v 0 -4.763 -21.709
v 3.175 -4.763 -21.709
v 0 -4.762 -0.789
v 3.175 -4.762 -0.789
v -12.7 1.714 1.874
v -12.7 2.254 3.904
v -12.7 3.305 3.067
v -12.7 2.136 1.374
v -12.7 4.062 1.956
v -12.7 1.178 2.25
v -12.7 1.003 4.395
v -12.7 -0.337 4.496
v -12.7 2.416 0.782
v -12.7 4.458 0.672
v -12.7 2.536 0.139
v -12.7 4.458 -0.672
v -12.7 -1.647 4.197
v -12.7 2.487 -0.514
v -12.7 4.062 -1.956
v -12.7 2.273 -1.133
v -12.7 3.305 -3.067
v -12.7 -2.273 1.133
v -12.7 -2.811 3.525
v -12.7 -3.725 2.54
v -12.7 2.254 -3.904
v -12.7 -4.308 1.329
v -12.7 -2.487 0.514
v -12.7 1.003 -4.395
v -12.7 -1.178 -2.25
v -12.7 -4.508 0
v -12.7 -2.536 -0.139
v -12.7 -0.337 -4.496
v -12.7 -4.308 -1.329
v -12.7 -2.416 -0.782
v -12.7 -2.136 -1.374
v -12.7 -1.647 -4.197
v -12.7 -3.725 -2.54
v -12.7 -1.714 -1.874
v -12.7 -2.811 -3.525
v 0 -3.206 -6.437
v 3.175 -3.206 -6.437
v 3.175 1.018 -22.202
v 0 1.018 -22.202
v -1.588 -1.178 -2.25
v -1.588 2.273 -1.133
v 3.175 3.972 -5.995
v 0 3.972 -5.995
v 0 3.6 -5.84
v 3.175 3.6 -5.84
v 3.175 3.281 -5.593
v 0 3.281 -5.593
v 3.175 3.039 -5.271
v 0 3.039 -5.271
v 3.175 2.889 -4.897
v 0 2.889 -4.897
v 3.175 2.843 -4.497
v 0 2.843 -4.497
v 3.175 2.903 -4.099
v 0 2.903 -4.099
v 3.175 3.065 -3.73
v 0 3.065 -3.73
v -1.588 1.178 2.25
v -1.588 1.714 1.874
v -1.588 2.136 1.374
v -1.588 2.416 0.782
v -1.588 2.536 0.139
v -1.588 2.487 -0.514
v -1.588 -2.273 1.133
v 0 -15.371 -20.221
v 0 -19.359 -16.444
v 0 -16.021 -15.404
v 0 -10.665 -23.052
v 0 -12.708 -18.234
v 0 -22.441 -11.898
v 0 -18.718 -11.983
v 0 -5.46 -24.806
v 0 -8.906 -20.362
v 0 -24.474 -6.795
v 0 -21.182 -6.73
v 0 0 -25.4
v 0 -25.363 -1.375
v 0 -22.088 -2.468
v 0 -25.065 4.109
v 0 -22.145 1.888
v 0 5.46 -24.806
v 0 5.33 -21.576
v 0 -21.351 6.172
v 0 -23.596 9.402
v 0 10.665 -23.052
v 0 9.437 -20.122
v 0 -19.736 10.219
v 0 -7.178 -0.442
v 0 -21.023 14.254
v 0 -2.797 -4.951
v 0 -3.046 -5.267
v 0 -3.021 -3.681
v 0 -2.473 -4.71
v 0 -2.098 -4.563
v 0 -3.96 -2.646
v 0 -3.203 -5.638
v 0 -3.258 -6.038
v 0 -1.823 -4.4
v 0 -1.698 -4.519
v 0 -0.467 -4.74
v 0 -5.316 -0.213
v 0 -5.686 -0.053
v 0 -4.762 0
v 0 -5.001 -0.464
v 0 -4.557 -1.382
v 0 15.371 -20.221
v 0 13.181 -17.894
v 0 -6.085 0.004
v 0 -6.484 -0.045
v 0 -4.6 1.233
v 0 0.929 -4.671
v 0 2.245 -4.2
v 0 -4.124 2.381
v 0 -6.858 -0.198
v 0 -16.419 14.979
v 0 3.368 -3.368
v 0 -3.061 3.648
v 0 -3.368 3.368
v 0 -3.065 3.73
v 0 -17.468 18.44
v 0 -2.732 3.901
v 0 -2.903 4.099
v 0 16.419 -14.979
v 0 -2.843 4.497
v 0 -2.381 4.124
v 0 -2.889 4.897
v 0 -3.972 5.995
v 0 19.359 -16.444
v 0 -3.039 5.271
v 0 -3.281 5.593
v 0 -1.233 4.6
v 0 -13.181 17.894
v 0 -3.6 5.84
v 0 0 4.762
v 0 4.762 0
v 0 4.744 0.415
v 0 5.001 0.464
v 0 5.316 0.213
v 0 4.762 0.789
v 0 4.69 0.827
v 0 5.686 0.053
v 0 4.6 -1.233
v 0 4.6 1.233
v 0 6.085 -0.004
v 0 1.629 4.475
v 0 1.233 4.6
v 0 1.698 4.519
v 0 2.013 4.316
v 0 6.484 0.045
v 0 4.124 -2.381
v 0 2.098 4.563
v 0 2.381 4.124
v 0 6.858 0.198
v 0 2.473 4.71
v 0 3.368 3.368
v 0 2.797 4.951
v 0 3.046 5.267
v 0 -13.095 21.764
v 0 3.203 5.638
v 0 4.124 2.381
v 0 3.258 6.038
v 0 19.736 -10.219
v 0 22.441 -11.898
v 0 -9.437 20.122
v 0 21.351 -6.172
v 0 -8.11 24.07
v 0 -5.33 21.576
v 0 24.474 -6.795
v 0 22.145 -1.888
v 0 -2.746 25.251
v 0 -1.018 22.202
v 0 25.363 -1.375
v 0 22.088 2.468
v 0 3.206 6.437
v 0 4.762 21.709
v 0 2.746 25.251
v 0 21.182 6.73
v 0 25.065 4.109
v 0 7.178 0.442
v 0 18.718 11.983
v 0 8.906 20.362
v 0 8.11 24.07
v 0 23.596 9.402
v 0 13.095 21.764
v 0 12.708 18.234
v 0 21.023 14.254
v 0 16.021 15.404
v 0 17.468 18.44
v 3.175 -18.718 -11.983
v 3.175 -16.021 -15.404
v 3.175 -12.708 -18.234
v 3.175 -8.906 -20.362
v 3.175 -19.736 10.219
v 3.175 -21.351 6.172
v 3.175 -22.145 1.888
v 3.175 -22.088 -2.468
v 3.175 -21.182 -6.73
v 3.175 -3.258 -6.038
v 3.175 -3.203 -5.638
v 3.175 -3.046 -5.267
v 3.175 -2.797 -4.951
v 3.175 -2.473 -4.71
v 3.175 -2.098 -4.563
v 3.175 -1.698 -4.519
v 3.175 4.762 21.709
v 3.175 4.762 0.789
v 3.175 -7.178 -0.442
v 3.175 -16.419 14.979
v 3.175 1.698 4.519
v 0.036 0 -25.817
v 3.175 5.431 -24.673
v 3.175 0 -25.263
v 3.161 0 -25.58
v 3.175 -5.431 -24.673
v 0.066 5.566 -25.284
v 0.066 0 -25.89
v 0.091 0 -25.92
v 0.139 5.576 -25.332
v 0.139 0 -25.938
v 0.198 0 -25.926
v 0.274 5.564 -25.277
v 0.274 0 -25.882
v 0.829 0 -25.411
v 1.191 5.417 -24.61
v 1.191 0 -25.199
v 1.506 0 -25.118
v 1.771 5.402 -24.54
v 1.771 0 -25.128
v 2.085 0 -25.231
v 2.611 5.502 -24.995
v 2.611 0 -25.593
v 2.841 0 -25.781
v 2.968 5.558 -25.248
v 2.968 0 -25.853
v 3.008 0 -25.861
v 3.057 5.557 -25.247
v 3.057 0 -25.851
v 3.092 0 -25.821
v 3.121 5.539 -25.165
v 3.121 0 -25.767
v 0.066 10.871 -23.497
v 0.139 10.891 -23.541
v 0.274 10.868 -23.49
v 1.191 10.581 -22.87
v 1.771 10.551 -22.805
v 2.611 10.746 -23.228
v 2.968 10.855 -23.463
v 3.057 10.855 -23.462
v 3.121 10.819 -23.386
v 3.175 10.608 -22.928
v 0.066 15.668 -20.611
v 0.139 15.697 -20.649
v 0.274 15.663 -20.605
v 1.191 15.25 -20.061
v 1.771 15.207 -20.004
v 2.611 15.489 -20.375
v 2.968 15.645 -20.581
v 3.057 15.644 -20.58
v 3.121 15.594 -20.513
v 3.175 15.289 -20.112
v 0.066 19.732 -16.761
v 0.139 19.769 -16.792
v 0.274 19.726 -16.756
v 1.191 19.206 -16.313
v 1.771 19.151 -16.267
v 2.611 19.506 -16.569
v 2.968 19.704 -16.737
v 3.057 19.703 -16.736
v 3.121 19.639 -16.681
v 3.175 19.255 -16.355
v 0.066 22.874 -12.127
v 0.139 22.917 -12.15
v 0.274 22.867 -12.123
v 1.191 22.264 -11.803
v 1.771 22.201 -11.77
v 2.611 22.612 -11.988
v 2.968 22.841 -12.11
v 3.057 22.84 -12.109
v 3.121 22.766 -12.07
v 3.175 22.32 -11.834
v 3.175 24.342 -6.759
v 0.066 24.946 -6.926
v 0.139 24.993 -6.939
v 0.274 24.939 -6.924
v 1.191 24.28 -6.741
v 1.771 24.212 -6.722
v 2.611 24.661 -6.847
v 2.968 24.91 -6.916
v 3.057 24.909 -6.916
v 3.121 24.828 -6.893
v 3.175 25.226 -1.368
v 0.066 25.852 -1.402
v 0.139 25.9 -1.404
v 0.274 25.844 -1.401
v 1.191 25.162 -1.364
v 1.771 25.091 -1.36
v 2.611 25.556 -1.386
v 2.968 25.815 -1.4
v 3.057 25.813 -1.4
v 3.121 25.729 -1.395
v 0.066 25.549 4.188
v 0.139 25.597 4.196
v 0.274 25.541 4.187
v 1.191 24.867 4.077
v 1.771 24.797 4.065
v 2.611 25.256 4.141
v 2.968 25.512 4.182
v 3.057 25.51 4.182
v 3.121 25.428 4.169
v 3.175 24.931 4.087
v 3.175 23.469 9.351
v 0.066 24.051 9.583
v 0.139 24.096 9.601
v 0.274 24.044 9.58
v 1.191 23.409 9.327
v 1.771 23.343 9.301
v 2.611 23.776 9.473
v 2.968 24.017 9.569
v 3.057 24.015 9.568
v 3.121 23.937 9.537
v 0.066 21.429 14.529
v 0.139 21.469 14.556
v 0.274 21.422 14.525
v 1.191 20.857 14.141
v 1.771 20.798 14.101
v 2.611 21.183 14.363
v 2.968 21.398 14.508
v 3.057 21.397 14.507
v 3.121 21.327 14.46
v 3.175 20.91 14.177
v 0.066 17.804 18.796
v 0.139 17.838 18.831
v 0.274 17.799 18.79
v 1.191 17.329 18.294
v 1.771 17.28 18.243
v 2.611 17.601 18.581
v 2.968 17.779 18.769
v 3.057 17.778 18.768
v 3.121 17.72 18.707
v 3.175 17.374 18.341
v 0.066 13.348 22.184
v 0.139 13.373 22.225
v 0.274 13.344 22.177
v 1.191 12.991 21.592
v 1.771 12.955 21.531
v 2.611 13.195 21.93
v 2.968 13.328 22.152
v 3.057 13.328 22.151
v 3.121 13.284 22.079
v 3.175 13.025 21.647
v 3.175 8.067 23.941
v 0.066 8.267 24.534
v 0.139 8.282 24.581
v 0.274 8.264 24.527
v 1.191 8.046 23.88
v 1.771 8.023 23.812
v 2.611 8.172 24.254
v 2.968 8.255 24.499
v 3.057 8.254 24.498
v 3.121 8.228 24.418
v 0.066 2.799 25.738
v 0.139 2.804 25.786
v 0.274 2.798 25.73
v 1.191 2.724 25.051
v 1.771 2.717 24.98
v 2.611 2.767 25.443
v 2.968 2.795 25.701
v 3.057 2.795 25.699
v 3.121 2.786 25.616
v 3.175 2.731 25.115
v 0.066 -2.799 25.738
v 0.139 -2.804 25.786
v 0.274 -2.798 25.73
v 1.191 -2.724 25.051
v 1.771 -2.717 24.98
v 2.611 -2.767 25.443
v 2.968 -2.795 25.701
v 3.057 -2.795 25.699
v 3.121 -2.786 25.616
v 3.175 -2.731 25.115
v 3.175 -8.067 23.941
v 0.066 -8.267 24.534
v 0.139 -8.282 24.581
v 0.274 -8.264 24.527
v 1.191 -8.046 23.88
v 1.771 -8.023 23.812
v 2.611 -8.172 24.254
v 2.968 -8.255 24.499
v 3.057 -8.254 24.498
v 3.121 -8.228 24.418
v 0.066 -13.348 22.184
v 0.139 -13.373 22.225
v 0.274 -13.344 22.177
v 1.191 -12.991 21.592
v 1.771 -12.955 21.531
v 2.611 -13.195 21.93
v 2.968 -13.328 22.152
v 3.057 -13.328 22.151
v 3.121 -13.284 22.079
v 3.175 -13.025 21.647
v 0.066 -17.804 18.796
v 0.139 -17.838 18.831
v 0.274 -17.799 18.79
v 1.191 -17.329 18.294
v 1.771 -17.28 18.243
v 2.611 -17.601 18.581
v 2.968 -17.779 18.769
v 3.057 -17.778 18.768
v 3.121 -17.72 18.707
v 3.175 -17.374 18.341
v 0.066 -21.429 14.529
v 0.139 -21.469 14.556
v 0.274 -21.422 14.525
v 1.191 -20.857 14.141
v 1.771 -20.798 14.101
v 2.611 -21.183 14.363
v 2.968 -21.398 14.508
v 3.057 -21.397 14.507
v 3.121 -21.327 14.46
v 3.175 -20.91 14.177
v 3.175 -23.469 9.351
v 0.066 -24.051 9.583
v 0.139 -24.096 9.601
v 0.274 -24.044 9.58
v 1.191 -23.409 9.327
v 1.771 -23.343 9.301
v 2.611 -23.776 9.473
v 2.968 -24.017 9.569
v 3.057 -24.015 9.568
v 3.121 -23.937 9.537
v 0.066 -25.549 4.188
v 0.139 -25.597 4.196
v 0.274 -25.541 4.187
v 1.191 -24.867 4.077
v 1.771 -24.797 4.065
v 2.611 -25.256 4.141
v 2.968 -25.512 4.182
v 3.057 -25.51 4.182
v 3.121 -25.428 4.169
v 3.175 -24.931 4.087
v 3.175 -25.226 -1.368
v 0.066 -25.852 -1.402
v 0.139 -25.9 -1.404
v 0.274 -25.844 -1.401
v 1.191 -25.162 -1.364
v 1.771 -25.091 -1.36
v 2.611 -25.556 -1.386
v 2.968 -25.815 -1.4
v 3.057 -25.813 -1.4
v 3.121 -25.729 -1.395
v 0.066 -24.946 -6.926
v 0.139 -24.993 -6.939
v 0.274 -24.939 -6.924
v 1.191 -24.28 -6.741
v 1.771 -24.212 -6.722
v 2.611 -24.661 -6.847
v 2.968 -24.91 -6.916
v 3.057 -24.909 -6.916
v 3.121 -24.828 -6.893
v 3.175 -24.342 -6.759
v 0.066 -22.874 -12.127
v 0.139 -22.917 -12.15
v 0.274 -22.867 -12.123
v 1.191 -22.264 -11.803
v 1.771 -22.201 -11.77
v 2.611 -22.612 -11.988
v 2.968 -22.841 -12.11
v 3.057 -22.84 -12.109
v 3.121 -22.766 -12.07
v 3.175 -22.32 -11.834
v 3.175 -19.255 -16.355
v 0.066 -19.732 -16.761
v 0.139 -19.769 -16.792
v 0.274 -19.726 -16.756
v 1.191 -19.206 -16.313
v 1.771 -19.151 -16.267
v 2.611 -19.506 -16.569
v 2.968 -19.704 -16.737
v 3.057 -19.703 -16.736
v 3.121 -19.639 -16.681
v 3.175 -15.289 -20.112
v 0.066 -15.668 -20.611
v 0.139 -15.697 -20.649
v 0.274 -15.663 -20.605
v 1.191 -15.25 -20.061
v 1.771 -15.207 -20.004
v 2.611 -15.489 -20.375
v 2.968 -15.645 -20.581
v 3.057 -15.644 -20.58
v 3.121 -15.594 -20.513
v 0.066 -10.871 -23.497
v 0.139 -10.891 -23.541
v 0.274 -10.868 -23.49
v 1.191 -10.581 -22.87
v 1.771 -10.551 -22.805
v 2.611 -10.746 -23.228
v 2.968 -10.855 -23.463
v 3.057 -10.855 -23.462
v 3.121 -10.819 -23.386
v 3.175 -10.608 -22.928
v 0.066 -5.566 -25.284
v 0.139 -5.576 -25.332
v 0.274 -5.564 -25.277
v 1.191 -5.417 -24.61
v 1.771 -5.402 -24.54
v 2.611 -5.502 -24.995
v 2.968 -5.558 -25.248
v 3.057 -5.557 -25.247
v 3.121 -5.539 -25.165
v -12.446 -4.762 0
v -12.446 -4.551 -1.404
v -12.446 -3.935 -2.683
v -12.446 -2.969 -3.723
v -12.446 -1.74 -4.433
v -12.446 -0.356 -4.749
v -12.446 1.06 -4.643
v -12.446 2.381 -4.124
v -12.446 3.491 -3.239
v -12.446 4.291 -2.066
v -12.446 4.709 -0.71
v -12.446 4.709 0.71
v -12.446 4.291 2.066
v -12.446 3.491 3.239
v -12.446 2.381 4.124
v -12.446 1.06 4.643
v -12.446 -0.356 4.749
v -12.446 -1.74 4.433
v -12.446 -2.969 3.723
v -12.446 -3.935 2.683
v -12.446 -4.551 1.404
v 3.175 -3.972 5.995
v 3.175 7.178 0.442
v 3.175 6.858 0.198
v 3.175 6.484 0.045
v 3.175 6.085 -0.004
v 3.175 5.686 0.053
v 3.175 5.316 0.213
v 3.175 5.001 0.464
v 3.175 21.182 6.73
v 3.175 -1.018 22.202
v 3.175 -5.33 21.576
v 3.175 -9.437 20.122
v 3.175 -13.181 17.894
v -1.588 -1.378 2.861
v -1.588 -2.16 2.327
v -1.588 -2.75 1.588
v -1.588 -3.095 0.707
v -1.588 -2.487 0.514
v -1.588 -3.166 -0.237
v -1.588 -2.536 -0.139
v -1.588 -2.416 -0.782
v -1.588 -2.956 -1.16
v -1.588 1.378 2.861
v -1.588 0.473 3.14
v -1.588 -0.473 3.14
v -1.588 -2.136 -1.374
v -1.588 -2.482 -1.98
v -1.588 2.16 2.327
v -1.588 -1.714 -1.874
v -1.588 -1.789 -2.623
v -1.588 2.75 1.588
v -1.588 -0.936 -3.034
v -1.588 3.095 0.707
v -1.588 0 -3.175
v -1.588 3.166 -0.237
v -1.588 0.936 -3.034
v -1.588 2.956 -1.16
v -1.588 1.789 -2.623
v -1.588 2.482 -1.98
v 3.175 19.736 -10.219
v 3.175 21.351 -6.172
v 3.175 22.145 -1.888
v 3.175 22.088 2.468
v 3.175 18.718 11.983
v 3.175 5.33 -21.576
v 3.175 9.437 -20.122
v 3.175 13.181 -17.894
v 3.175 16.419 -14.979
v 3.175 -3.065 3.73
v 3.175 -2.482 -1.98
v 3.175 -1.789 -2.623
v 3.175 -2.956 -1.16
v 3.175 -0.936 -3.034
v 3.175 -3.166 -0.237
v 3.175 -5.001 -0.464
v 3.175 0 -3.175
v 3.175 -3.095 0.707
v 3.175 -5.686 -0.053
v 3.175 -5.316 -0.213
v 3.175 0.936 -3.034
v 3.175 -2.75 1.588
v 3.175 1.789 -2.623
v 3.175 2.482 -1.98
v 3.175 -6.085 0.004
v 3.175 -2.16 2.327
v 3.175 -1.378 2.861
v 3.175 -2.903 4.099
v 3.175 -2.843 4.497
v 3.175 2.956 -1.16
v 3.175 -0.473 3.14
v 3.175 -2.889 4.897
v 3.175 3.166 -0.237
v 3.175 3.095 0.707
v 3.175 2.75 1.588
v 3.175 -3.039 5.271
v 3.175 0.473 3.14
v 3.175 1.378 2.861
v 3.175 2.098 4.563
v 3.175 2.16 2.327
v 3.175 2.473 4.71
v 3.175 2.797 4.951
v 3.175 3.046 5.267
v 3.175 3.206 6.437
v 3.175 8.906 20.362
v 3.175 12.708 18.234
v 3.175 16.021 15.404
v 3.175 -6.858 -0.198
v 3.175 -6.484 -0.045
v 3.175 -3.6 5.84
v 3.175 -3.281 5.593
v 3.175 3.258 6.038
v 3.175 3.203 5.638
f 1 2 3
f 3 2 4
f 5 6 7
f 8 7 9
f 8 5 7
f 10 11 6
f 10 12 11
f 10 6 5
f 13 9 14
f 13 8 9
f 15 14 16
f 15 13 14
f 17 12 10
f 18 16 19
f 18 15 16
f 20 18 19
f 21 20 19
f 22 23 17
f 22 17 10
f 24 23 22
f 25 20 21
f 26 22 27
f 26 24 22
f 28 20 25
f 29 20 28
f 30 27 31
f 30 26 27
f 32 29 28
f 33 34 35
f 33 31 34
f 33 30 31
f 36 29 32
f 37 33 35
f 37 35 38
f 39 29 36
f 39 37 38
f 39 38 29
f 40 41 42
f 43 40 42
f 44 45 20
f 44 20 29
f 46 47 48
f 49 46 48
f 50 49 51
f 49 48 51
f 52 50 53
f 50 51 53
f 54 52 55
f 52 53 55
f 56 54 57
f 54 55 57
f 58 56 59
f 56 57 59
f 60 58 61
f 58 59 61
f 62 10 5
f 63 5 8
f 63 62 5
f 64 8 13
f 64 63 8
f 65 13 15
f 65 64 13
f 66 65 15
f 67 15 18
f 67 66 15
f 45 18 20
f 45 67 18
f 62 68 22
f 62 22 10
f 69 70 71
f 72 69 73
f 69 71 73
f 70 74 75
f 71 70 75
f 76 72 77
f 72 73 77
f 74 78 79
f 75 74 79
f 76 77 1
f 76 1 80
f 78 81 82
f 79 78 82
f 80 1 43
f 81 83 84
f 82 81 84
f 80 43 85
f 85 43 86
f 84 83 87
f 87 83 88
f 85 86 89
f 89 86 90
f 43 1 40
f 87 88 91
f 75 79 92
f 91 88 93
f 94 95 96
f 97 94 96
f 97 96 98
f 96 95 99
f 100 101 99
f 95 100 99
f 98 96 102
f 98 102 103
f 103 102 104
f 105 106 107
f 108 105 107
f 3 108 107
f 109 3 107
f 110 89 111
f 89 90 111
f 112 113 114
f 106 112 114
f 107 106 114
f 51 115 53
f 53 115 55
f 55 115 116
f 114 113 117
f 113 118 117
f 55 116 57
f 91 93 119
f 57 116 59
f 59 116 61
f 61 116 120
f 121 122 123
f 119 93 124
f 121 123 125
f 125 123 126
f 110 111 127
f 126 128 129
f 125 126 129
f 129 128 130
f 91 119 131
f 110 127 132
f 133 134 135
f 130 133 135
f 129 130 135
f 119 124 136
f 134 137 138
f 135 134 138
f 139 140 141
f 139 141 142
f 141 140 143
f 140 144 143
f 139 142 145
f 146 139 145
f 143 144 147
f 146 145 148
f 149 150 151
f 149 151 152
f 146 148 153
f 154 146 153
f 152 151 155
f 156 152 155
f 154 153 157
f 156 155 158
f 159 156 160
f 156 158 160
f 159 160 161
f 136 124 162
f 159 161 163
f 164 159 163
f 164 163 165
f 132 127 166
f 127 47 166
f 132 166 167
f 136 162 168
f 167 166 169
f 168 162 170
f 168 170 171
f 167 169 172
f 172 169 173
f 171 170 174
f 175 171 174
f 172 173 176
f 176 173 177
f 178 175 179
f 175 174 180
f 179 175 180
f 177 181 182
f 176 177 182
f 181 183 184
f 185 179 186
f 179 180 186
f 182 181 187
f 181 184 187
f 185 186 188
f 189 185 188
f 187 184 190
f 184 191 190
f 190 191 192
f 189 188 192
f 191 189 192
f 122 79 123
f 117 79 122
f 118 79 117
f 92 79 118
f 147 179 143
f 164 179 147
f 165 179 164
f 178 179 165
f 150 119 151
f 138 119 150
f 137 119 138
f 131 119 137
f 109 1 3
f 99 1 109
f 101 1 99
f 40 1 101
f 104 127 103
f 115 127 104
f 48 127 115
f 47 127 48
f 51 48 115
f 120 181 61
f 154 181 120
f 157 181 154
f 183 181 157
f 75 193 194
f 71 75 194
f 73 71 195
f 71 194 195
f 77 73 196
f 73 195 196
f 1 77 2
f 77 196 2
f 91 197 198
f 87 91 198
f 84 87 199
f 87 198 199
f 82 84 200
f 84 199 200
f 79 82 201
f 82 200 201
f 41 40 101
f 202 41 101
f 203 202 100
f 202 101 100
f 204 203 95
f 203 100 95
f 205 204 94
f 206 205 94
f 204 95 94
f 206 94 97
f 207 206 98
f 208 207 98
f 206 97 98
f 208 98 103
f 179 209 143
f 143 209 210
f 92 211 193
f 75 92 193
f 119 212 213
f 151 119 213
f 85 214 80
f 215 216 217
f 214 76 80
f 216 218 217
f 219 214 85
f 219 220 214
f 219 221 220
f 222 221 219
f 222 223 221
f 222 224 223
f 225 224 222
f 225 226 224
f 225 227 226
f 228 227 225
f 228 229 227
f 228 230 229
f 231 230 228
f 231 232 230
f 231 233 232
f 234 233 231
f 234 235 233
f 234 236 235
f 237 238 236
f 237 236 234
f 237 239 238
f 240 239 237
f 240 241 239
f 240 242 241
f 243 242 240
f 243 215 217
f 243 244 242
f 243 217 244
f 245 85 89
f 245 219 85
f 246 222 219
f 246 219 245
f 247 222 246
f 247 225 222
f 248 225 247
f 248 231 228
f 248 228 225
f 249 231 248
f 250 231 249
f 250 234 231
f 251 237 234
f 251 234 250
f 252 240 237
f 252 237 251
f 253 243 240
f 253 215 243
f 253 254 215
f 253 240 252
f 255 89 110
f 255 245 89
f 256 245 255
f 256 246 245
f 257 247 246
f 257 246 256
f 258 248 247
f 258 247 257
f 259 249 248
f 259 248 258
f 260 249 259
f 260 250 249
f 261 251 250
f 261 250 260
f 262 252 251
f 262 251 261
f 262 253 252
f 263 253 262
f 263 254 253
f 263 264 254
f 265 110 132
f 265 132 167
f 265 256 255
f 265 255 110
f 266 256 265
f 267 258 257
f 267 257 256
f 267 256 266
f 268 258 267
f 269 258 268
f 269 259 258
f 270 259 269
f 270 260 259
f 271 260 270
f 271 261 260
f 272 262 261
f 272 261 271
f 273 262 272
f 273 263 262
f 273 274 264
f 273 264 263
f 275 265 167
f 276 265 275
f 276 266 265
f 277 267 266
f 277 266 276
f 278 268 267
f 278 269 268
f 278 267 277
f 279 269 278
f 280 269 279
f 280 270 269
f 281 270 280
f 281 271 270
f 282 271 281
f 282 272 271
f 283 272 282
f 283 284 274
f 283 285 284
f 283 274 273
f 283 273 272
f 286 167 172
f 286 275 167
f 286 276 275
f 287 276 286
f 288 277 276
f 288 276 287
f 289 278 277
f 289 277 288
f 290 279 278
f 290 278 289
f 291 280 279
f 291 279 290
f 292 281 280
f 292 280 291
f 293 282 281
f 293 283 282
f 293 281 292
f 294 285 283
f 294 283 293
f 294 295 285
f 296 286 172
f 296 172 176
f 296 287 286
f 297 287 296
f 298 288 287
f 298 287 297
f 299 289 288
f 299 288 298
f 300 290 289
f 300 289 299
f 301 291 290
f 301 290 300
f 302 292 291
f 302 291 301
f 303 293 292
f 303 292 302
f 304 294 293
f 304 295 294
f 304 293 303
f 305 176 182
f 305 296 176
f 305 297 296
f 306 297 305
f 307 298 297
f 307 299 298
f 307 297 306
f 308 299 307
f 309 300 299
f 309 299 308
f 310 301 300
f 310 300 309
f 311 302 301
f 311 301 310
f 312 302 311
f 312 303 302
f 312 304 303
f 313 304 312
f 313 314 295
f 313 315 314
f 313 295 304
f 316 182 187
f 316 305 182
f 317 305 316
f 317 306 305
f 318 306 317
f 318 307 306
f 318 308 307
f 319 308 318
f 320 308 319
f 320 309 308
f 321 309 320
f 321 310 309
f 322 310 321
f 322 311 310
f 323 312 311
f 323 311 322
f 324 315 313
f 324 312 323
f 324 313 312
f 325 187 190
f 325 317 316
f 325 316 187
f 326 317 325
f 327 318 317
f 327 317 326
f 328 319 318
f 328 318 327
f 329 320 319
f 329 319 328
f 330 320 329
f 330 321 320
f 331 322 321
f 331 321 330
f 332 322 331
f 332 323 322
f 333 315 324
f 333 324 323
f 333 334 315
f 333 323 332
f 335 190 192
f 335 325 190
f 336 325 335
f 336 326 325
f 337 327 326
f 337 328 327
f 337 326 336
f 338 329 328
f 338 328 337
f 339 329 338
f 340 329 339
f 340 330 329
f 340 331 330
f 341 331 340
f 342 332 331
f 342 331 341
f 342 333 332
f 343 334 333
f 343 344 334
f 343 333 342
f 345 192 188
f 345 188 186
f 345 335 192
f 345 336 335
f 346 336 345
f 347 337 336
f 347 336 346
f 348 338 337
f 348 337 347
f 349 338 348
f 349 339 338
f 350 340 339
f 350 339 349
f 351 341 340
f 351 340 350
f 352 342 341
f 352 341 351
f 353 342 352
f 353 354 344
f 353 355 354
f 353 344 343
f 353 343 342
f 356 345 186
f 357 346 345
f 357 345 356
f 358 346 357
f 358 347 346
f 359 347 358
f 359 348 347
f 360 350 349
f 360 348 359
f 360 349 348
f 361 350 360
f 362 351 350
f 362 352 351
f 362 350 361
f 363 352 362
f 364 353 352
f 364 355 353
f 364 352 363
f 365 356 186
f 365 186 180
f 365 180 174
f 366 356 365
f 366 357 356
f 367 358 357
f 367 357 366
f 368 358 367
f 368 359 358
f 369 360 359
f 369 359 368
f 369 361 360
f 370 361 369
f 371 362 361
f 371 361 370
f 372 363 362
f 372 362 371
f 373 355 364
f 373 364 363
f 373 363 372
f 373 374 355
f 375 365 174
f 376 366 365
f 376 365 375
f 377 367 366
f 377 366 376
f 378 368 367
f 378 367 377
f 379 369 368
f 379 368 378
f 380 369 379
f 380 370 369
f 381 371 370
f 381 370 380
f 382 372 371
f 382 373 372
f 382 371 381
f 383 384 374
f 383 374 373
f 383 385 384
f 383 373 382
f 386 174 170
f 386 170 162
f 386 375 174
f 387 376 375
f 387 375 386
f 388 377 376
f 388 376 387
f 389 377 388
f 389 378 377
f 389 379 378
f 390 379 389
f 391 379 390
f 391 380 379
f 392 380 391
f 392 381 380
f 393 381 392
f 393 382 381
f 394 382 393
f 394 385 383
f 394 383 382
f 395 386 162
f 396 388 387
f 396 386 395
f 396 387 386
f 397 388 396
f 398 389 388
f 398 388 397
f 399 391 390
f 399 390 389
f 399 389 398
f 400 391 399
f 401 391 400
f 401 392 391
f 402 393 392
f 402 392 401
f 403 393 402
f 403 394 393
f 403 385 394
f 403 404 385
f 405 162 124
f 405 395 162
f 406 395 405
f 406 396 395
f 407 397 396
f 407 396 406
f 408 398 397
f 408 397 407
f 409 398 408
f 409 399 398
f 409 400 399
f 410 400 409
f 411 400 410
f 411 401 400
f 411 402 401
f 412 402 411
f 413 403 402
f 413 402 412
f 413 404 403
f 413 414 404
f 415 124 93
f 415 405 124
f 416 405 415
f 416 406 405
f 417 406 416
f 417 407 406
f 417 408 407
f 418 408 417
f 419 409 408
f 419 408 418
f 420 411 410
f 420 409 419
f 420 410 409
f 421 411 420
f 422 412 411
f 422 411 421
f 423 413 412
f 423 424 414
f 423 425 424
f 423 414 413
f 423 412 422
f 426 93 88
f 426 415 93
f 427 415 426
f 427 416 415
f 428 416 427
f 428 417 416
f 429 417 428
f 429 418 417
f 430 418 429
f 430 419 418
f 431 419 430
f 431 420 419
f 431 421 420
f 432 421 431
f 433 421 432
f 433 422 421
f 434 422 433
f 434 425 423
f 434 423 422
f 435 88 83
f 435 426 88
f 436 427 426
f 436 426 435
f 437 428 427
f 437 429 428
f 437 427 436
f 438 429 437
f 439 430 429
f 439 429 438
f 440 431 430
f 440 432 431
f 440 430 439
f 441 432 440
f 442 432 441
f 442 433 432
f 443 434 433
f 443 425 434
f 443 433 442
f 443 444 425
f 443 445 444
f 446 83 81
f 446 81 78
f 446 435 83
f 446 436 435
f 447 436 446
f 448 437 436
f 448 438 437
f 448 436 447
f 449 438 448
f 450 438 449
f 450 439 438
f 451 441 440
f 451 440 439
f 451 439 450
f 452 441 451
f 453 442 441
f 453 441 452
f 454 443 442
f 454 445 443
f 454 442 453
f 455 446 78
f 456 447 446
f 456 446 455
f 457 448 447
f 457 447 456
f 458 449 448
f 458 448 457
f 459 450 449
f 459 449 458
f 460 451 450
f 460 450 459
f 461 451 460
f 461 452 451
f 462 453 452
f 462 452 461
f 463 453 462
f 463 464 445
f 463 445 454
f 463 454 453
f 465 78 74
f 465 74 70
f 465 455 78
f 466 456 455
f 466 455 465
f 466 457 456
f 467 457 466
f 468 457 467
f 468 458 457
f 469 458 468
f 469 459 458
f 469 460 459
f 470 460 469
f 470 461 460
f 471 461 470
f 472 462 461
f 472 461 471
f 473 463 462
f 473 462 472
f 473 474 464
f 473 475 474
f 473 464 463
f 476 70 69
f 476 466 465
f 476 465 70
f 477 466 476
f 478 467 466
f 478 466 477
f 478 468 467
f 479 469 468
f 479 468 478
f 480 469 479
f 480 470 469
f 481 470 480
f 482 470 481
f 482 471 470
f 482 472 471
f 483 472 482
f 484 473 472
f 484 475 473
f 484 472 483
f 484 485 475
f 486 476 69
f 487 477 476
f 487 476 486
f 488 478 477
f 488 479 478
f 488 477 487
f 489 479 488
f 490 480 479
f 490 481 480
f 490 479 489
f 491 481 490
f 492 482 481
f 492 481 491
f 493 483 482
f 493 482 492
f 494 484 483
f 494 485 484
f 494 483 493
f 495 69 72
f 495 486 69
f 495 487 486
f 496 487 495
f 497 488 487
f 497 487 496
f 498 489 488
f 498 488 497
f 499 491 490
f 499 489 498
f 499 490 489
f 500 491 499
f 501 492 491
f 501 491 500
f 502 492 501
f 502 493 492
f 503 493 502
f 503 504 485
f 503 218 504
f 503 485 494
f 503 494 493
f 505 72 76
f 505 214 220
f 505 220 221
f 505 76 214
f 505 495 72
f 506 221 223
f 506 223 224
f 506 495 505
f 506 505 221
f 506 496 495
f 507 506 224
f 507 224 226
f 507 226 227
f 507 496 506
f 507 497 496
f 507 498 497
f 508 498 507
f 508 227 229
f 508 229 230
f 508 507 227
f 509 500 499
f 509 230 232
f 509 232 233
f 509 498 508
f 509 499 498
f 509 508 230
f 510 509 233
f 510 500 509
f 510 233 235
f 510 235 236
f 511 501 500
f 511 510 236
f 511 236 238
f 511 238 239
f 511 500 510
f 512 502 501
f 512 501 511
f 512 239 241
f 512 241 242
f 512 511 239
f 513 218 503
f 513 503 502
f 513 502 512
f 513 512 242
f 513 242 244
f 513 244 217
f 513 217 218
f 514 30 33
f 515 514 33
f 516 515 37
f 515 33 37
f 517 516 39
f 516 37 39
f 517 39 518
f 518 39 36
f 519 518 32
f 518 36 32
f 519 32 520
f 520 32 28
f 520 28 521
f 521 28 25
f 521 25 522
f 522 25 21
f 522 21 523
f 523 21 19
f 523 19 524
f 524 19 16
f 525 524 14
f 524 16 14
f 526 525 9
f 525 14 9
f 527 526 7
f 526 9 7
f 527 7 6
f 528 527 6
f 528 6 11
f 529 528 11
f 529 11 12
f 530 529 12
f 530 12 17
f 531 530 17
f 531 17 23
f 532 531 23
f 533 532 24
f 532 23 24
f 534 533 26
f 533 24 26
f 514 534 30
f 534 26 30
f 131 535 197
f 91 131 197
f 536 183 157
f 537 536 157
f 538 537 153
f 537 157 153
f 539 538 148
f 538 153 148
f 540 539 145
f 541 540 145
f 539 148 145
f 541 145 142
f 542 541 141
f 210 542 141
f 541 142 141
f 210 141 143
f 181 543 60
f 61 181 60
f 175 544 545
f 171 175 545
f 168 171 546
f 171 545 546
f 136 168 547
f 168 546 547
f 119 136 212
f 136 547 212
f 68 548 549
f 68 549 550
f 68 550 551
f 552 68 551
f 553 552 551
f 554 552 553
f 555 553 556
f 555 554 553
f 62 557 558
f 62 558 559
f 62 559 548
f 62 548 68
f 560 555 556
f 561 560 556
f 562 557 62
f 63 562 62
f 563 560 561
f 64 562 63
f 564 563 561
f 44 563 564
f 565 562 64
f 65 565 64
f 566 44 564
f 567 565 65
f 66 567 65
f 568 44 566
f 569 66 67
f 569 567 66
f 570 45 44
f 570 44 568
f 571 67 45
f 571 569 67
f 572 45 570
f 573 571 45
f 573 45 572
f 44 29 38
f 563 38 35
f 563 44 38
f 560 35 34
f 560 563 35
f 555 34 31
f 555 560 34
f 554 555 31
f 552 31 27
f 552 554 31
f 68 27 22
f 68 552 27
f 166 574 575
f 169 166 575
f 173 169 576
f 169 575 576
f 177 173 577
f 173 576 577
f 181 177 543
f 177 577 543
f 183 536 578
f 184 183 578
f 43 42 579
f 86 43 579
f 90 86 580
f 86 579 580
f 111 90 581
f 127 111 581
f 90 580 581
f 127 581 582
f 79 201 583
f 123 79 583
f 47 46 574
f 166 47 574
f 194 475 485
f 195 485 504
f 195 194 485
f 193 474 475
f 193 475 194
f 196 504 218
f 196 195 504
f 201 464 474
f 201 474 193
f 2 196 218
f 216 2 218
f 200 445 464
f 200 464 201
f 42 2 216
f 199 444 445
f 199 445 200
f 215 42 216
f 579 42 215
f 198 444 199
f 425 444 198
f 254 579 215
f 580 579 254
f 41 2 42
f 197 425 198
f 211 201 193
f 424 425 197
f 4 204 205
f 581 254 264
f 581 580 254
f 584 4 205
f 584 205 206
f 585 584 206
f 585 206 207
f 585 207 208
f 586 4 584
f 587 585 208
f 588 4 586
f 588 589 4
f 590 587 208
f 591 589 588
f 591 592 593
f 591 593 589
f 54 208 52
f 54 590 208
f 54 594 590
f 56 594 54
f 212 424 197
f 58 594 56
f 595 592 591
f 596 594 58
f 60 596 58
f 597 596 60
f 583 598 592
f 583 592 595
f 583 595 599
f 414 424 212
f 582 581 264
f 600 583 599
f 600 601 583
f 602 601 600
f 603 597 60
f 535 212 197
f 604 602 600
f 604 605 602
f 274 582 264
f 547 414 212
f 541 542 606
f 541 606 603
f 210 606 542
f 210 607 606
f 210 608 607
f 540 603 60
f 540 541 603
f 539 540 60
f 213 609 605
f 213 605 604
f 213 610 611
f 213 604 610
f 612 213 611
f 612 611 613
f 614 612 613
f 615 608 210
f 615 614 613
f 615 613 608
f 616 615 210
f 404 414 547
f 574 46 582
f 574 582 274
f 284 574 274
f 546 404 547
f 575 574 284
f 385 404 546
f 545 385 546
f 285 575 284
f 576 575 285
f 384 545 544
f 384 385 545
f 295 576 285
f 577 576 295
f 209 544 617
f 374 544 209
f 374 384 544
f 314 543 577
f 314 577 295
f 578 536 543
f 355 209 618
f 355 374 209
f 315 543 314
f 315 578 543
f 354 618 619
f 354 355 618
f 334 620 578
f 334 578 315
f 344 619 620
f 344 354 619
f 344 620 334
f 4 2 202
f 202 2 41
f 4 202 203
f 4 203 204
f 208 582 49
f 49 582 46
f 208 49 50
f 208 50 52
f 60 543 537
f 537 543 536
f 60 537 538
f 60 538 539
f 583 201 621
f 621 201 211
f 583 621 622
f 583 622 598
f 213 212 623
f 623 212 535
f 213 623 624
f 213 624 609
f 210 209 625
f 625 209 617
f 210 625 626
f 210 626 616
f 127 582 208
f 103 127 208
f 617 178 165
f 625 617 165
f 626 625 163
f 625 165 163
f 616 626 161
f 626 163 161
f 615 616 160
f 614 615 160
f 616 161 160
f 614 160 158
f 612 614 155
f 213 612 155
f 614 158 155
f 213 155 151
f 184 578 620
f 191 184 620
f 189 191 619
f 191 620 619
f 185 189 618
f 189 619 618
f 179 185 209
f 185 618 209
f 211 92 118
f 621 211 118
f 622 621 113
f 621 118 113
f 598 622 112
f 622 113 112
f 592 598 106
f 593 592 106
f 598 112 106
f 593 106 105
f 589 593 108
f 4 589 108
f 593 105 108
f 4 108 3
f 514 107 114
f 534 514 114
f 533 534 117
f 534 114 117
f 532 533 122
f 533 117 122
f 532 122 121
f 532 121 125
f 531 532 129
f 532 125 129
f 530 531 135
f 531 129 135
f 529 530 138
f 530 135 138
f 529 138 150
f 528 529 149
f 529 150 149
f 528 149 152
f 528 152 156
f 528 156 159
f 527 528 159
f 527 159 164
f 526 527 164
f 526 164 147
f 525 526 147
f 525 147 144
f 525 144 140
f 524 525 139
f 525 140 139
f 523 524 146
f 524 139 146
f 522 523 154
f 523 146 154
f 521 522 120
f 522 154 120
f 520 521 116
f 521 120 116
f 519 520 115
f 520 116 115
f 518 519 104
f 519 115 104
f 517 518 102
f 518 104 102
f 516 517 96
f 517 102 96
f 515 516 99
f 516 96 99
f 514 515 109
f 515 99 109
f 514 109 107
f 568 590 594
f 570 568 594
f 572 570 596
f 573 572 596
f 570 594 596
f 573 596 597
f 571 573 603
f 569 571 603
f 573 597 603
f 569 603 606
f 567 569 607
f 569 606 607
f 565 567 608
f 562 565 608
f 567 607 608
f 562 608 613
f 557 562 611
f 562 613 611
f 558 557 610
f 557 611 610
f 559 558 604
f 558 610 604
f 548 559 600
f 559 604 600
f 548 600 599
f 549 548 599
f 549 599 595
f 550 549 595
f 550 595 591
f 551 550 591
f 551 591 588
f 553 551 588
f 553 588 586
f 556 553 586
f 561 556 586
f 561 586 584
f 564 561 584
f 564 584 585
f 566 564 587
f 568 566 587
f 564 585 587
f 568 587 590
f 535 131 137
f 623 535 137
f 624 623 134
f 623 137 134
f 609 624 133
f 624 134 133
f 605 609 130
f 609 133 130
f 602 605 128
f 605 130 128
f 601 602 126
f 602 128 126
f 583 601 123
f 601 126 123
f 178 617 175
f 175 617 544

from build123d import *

# Parameters (mm, degrees)
SKETCH2_R           = 4.7625
BOSS_EXTRUDE1_DEPTH = 12.7
CUT_EXTRUDE1_DEPTH  = 40.970251034
CIRPATTERN1_COUNT   = 6
FILLET1_DEPTH       = 3.175
CHAMFER1_SIZE       = 0.254
SKETCH4_R           = 3.175
CUT_EXTRUDE2_DEPTH  = 4.7625


with BuildPart() as part:
    # Sketch1 → Revolve1 (revolve)
    with BuildSketch(Plane(origin=(0, 0, 0), x_dir=(1, 0, 0), z_dir=(0, 1, 0))):
        with BuildLine():
            Line((0, 0), (3.175, 0))
            Line((3.175, 0), (3.175, 25.263345398))
            add(Edge.make_bspline(
                [(0, 25.4), (0, 27.803345398), (1.5875, 21.453345398), (3.175, 27.803345398), (3.175, 25.263345398)],
                knots=[0, 0, 0, 0, 0, 1, 1, 1, 1, 1], degree=4))
            Line((0, 25.4), (0, 0))
        make_face()
    revolve(axis=Axis((0, 0, 0), (1, 0, 0)))

    # Sketch2 → Boss-Extrude1 (add)
    with BuildSketch(Plane.ZY):
        with Locations(Location((0, 0, 0), (0, 0, 180))):
            Circle(SKETCH2_R)
        with BuildLine():
            Line((1.132738197, -2.273434446), (2.250324949, 1.177980315))
            ThreePointArc((2.250324949, 1.177980315), (0.782467236, 2.416473676), (-1.132738197, 2.273434446))
            Line((-1.132738197, 2.273434446), (-2.250324949, -1.177980315))
            ThreePointArc((-2.250324949, -1.177980315), (-0.782467236, -2.416473676), (1.132738197, -2.273434446))
        make_face(mode=Mode.SUBTRACT)
    extrude(amount=BOSS_EXTRUDE1_DEPTH)

    # Sketch3 → Cut-Extrude1 (cut, through all)
    with BuildSketch(Plane(origin=(3.175, 0, 0), x_dir=(0, 0, -1), z_dir=(1, 0, 0))):
        with BuildLine():
            Line((-21.708736001, 4.7625), (0, 4.7625))
            ThreePointArc((0, 4.7625), (1.822529847, 4.399976274), (3.367596045, 3.367596045))
            Line((3.367596045, 3.367596045), (-11.982798392, 18.717990483))
            ThreePointArc((-11.982798392, 18.717990483), (-18.233727021, 12.707549879), (-21.708736001, 4.7625))
        make_face()
    cut_extrude1 = extrude(amount=-CUT_EXTRUDE1_DEPTH, mode=Mode.SUBTRACT)

    # CirPattern1: Cut-Extrude1 ×6 about axis
    cirpattern1_axis = Axis((0, 0, 0), (1, 0, 0))
    for i in range(1, CIRPATTERN1_COUNT):
        add(cut_extrude1.rotate(cirpattern1_axis, i * 360 / CIRPATTERN1_COUNT), mode=Mode.SUBTRACT)

    # Fillet1: read off the stored shape, not the designer's step
    # Fillet1 outline → Fillet1 (add)
    with BuildSketch(Plane.YZ):
        with BuildLine():
            ThreePointArc((-3.971931086, 5.994778536), (-2.951584128, 5.089234917), (-3.064928685, 3.729723913))
            Line((-3.064928685, 3.729723913), (-2.38125, 4.124445986))
            ThreePointArc((-2.38125, 4.124445986), (-0.621630991, 4.721756152), (1.232625702, 4.600221748))
            Line((1.232625702, 4.600221748), (-3.971931086, 5.994778536))
        make_face()
        with BuildLine():
            ThreePointArc((-4.7625, 0), (-4.399976274, 1.822529847), (-3.367596045, 3.367596045))
            Line((-3.367596045, 3.367596045), (-7.177596045, -0.442403955))
            ThreePointArc((-7.177596045, -0.442403955), (-5.883198788, -0.011529378), (-4.7625, -0.789444146))
            Line((-4.7625, -0.789444146), (-4.7625, 0))
        make_face()
        with BuildLine():
            Line((1.697571315, 4.519168058), (2.38125, 4.124445986))
            ThreePointArc((2.38125, 4.124445986), (3.778345283, 2.899226306), (4.600221748, 1.232625702))
            Line((4.600221748, 1.232625702), (3.205664959, 6.437182491))
            ThreePointArc((3.205664959, 6.437182491), (2.93161466, 5.100764295), (1.697571315, 4.519168058))
        make_face()
        with BuildLine():
            ThreePointArc((-2.38125, -4.124445986), (-3.778345283, -2.899226306), (-4.600221748, -1.232625702))
            Line((-4.600221748, -1.232625702), (-3.205664959, -6.437182491))
            ThreePointArc((-3.205664959, -6.437182491), (-2.93161466, -5.100764295), (-1.697571315, -4.519168058))
            Line((-1.697571315, -4.519168058), (-2.38125, -4.124445986))
        make_face()
        with BuildLine():
            Line((4.7625, 0.789444146), (4.7625, 0))
            ThreePointArc((4.7625, 0), (4.399976274, -1.822529847), (3.367596045, -3.367596045))
            Line((3.367596045, -3.367596045), (7.177596045, 0.442403955))
            ThreePointArc((7.177596045, 0.442403955), (5.883198788, 0.011529378), (4.7625, 0.789444146))
        make_face()
        with BuildLine():
            ThreePointArc((2.38125, -4.124445986), (0.621630991, -4.721756152), (-1.232625702, -4.600221748))
            Line((-1.232625702, -4.600221748), (3.971931086, -5.994778536))
            ThreePointArc((3.971931086, -5.994778536), (2.951584128, -5.089234917), (3.064928685, -3.729723913))
            Line((3.064928685, -3.729723913), (2.38125, -4.124445986))
        make_face()
    extrude(amount=FILLET1_DEPTH)

    # Chamfer1
    chamfer1_edges = [part.edges().sort_by_distance(p)[0] for p in [
        (-12.7, 0, 4.7625),
    ]]
    chamfer(chamfer1_edges, length=CHAMFER1_SIZE)

    # Sketch4 → Cut-Extrude2 (cut)
    with BuildSketch(Plane(origin=(3.175, 0, 0), x_dir=(0, 0, -1), z_dir=(1, 0, 0))):
        Circle(SKETCH4_R)
    extrude(amount=-CUT_EXTRUDE2_DEPTH, mode=Mode.SUBTRACT)


solid = part.part
